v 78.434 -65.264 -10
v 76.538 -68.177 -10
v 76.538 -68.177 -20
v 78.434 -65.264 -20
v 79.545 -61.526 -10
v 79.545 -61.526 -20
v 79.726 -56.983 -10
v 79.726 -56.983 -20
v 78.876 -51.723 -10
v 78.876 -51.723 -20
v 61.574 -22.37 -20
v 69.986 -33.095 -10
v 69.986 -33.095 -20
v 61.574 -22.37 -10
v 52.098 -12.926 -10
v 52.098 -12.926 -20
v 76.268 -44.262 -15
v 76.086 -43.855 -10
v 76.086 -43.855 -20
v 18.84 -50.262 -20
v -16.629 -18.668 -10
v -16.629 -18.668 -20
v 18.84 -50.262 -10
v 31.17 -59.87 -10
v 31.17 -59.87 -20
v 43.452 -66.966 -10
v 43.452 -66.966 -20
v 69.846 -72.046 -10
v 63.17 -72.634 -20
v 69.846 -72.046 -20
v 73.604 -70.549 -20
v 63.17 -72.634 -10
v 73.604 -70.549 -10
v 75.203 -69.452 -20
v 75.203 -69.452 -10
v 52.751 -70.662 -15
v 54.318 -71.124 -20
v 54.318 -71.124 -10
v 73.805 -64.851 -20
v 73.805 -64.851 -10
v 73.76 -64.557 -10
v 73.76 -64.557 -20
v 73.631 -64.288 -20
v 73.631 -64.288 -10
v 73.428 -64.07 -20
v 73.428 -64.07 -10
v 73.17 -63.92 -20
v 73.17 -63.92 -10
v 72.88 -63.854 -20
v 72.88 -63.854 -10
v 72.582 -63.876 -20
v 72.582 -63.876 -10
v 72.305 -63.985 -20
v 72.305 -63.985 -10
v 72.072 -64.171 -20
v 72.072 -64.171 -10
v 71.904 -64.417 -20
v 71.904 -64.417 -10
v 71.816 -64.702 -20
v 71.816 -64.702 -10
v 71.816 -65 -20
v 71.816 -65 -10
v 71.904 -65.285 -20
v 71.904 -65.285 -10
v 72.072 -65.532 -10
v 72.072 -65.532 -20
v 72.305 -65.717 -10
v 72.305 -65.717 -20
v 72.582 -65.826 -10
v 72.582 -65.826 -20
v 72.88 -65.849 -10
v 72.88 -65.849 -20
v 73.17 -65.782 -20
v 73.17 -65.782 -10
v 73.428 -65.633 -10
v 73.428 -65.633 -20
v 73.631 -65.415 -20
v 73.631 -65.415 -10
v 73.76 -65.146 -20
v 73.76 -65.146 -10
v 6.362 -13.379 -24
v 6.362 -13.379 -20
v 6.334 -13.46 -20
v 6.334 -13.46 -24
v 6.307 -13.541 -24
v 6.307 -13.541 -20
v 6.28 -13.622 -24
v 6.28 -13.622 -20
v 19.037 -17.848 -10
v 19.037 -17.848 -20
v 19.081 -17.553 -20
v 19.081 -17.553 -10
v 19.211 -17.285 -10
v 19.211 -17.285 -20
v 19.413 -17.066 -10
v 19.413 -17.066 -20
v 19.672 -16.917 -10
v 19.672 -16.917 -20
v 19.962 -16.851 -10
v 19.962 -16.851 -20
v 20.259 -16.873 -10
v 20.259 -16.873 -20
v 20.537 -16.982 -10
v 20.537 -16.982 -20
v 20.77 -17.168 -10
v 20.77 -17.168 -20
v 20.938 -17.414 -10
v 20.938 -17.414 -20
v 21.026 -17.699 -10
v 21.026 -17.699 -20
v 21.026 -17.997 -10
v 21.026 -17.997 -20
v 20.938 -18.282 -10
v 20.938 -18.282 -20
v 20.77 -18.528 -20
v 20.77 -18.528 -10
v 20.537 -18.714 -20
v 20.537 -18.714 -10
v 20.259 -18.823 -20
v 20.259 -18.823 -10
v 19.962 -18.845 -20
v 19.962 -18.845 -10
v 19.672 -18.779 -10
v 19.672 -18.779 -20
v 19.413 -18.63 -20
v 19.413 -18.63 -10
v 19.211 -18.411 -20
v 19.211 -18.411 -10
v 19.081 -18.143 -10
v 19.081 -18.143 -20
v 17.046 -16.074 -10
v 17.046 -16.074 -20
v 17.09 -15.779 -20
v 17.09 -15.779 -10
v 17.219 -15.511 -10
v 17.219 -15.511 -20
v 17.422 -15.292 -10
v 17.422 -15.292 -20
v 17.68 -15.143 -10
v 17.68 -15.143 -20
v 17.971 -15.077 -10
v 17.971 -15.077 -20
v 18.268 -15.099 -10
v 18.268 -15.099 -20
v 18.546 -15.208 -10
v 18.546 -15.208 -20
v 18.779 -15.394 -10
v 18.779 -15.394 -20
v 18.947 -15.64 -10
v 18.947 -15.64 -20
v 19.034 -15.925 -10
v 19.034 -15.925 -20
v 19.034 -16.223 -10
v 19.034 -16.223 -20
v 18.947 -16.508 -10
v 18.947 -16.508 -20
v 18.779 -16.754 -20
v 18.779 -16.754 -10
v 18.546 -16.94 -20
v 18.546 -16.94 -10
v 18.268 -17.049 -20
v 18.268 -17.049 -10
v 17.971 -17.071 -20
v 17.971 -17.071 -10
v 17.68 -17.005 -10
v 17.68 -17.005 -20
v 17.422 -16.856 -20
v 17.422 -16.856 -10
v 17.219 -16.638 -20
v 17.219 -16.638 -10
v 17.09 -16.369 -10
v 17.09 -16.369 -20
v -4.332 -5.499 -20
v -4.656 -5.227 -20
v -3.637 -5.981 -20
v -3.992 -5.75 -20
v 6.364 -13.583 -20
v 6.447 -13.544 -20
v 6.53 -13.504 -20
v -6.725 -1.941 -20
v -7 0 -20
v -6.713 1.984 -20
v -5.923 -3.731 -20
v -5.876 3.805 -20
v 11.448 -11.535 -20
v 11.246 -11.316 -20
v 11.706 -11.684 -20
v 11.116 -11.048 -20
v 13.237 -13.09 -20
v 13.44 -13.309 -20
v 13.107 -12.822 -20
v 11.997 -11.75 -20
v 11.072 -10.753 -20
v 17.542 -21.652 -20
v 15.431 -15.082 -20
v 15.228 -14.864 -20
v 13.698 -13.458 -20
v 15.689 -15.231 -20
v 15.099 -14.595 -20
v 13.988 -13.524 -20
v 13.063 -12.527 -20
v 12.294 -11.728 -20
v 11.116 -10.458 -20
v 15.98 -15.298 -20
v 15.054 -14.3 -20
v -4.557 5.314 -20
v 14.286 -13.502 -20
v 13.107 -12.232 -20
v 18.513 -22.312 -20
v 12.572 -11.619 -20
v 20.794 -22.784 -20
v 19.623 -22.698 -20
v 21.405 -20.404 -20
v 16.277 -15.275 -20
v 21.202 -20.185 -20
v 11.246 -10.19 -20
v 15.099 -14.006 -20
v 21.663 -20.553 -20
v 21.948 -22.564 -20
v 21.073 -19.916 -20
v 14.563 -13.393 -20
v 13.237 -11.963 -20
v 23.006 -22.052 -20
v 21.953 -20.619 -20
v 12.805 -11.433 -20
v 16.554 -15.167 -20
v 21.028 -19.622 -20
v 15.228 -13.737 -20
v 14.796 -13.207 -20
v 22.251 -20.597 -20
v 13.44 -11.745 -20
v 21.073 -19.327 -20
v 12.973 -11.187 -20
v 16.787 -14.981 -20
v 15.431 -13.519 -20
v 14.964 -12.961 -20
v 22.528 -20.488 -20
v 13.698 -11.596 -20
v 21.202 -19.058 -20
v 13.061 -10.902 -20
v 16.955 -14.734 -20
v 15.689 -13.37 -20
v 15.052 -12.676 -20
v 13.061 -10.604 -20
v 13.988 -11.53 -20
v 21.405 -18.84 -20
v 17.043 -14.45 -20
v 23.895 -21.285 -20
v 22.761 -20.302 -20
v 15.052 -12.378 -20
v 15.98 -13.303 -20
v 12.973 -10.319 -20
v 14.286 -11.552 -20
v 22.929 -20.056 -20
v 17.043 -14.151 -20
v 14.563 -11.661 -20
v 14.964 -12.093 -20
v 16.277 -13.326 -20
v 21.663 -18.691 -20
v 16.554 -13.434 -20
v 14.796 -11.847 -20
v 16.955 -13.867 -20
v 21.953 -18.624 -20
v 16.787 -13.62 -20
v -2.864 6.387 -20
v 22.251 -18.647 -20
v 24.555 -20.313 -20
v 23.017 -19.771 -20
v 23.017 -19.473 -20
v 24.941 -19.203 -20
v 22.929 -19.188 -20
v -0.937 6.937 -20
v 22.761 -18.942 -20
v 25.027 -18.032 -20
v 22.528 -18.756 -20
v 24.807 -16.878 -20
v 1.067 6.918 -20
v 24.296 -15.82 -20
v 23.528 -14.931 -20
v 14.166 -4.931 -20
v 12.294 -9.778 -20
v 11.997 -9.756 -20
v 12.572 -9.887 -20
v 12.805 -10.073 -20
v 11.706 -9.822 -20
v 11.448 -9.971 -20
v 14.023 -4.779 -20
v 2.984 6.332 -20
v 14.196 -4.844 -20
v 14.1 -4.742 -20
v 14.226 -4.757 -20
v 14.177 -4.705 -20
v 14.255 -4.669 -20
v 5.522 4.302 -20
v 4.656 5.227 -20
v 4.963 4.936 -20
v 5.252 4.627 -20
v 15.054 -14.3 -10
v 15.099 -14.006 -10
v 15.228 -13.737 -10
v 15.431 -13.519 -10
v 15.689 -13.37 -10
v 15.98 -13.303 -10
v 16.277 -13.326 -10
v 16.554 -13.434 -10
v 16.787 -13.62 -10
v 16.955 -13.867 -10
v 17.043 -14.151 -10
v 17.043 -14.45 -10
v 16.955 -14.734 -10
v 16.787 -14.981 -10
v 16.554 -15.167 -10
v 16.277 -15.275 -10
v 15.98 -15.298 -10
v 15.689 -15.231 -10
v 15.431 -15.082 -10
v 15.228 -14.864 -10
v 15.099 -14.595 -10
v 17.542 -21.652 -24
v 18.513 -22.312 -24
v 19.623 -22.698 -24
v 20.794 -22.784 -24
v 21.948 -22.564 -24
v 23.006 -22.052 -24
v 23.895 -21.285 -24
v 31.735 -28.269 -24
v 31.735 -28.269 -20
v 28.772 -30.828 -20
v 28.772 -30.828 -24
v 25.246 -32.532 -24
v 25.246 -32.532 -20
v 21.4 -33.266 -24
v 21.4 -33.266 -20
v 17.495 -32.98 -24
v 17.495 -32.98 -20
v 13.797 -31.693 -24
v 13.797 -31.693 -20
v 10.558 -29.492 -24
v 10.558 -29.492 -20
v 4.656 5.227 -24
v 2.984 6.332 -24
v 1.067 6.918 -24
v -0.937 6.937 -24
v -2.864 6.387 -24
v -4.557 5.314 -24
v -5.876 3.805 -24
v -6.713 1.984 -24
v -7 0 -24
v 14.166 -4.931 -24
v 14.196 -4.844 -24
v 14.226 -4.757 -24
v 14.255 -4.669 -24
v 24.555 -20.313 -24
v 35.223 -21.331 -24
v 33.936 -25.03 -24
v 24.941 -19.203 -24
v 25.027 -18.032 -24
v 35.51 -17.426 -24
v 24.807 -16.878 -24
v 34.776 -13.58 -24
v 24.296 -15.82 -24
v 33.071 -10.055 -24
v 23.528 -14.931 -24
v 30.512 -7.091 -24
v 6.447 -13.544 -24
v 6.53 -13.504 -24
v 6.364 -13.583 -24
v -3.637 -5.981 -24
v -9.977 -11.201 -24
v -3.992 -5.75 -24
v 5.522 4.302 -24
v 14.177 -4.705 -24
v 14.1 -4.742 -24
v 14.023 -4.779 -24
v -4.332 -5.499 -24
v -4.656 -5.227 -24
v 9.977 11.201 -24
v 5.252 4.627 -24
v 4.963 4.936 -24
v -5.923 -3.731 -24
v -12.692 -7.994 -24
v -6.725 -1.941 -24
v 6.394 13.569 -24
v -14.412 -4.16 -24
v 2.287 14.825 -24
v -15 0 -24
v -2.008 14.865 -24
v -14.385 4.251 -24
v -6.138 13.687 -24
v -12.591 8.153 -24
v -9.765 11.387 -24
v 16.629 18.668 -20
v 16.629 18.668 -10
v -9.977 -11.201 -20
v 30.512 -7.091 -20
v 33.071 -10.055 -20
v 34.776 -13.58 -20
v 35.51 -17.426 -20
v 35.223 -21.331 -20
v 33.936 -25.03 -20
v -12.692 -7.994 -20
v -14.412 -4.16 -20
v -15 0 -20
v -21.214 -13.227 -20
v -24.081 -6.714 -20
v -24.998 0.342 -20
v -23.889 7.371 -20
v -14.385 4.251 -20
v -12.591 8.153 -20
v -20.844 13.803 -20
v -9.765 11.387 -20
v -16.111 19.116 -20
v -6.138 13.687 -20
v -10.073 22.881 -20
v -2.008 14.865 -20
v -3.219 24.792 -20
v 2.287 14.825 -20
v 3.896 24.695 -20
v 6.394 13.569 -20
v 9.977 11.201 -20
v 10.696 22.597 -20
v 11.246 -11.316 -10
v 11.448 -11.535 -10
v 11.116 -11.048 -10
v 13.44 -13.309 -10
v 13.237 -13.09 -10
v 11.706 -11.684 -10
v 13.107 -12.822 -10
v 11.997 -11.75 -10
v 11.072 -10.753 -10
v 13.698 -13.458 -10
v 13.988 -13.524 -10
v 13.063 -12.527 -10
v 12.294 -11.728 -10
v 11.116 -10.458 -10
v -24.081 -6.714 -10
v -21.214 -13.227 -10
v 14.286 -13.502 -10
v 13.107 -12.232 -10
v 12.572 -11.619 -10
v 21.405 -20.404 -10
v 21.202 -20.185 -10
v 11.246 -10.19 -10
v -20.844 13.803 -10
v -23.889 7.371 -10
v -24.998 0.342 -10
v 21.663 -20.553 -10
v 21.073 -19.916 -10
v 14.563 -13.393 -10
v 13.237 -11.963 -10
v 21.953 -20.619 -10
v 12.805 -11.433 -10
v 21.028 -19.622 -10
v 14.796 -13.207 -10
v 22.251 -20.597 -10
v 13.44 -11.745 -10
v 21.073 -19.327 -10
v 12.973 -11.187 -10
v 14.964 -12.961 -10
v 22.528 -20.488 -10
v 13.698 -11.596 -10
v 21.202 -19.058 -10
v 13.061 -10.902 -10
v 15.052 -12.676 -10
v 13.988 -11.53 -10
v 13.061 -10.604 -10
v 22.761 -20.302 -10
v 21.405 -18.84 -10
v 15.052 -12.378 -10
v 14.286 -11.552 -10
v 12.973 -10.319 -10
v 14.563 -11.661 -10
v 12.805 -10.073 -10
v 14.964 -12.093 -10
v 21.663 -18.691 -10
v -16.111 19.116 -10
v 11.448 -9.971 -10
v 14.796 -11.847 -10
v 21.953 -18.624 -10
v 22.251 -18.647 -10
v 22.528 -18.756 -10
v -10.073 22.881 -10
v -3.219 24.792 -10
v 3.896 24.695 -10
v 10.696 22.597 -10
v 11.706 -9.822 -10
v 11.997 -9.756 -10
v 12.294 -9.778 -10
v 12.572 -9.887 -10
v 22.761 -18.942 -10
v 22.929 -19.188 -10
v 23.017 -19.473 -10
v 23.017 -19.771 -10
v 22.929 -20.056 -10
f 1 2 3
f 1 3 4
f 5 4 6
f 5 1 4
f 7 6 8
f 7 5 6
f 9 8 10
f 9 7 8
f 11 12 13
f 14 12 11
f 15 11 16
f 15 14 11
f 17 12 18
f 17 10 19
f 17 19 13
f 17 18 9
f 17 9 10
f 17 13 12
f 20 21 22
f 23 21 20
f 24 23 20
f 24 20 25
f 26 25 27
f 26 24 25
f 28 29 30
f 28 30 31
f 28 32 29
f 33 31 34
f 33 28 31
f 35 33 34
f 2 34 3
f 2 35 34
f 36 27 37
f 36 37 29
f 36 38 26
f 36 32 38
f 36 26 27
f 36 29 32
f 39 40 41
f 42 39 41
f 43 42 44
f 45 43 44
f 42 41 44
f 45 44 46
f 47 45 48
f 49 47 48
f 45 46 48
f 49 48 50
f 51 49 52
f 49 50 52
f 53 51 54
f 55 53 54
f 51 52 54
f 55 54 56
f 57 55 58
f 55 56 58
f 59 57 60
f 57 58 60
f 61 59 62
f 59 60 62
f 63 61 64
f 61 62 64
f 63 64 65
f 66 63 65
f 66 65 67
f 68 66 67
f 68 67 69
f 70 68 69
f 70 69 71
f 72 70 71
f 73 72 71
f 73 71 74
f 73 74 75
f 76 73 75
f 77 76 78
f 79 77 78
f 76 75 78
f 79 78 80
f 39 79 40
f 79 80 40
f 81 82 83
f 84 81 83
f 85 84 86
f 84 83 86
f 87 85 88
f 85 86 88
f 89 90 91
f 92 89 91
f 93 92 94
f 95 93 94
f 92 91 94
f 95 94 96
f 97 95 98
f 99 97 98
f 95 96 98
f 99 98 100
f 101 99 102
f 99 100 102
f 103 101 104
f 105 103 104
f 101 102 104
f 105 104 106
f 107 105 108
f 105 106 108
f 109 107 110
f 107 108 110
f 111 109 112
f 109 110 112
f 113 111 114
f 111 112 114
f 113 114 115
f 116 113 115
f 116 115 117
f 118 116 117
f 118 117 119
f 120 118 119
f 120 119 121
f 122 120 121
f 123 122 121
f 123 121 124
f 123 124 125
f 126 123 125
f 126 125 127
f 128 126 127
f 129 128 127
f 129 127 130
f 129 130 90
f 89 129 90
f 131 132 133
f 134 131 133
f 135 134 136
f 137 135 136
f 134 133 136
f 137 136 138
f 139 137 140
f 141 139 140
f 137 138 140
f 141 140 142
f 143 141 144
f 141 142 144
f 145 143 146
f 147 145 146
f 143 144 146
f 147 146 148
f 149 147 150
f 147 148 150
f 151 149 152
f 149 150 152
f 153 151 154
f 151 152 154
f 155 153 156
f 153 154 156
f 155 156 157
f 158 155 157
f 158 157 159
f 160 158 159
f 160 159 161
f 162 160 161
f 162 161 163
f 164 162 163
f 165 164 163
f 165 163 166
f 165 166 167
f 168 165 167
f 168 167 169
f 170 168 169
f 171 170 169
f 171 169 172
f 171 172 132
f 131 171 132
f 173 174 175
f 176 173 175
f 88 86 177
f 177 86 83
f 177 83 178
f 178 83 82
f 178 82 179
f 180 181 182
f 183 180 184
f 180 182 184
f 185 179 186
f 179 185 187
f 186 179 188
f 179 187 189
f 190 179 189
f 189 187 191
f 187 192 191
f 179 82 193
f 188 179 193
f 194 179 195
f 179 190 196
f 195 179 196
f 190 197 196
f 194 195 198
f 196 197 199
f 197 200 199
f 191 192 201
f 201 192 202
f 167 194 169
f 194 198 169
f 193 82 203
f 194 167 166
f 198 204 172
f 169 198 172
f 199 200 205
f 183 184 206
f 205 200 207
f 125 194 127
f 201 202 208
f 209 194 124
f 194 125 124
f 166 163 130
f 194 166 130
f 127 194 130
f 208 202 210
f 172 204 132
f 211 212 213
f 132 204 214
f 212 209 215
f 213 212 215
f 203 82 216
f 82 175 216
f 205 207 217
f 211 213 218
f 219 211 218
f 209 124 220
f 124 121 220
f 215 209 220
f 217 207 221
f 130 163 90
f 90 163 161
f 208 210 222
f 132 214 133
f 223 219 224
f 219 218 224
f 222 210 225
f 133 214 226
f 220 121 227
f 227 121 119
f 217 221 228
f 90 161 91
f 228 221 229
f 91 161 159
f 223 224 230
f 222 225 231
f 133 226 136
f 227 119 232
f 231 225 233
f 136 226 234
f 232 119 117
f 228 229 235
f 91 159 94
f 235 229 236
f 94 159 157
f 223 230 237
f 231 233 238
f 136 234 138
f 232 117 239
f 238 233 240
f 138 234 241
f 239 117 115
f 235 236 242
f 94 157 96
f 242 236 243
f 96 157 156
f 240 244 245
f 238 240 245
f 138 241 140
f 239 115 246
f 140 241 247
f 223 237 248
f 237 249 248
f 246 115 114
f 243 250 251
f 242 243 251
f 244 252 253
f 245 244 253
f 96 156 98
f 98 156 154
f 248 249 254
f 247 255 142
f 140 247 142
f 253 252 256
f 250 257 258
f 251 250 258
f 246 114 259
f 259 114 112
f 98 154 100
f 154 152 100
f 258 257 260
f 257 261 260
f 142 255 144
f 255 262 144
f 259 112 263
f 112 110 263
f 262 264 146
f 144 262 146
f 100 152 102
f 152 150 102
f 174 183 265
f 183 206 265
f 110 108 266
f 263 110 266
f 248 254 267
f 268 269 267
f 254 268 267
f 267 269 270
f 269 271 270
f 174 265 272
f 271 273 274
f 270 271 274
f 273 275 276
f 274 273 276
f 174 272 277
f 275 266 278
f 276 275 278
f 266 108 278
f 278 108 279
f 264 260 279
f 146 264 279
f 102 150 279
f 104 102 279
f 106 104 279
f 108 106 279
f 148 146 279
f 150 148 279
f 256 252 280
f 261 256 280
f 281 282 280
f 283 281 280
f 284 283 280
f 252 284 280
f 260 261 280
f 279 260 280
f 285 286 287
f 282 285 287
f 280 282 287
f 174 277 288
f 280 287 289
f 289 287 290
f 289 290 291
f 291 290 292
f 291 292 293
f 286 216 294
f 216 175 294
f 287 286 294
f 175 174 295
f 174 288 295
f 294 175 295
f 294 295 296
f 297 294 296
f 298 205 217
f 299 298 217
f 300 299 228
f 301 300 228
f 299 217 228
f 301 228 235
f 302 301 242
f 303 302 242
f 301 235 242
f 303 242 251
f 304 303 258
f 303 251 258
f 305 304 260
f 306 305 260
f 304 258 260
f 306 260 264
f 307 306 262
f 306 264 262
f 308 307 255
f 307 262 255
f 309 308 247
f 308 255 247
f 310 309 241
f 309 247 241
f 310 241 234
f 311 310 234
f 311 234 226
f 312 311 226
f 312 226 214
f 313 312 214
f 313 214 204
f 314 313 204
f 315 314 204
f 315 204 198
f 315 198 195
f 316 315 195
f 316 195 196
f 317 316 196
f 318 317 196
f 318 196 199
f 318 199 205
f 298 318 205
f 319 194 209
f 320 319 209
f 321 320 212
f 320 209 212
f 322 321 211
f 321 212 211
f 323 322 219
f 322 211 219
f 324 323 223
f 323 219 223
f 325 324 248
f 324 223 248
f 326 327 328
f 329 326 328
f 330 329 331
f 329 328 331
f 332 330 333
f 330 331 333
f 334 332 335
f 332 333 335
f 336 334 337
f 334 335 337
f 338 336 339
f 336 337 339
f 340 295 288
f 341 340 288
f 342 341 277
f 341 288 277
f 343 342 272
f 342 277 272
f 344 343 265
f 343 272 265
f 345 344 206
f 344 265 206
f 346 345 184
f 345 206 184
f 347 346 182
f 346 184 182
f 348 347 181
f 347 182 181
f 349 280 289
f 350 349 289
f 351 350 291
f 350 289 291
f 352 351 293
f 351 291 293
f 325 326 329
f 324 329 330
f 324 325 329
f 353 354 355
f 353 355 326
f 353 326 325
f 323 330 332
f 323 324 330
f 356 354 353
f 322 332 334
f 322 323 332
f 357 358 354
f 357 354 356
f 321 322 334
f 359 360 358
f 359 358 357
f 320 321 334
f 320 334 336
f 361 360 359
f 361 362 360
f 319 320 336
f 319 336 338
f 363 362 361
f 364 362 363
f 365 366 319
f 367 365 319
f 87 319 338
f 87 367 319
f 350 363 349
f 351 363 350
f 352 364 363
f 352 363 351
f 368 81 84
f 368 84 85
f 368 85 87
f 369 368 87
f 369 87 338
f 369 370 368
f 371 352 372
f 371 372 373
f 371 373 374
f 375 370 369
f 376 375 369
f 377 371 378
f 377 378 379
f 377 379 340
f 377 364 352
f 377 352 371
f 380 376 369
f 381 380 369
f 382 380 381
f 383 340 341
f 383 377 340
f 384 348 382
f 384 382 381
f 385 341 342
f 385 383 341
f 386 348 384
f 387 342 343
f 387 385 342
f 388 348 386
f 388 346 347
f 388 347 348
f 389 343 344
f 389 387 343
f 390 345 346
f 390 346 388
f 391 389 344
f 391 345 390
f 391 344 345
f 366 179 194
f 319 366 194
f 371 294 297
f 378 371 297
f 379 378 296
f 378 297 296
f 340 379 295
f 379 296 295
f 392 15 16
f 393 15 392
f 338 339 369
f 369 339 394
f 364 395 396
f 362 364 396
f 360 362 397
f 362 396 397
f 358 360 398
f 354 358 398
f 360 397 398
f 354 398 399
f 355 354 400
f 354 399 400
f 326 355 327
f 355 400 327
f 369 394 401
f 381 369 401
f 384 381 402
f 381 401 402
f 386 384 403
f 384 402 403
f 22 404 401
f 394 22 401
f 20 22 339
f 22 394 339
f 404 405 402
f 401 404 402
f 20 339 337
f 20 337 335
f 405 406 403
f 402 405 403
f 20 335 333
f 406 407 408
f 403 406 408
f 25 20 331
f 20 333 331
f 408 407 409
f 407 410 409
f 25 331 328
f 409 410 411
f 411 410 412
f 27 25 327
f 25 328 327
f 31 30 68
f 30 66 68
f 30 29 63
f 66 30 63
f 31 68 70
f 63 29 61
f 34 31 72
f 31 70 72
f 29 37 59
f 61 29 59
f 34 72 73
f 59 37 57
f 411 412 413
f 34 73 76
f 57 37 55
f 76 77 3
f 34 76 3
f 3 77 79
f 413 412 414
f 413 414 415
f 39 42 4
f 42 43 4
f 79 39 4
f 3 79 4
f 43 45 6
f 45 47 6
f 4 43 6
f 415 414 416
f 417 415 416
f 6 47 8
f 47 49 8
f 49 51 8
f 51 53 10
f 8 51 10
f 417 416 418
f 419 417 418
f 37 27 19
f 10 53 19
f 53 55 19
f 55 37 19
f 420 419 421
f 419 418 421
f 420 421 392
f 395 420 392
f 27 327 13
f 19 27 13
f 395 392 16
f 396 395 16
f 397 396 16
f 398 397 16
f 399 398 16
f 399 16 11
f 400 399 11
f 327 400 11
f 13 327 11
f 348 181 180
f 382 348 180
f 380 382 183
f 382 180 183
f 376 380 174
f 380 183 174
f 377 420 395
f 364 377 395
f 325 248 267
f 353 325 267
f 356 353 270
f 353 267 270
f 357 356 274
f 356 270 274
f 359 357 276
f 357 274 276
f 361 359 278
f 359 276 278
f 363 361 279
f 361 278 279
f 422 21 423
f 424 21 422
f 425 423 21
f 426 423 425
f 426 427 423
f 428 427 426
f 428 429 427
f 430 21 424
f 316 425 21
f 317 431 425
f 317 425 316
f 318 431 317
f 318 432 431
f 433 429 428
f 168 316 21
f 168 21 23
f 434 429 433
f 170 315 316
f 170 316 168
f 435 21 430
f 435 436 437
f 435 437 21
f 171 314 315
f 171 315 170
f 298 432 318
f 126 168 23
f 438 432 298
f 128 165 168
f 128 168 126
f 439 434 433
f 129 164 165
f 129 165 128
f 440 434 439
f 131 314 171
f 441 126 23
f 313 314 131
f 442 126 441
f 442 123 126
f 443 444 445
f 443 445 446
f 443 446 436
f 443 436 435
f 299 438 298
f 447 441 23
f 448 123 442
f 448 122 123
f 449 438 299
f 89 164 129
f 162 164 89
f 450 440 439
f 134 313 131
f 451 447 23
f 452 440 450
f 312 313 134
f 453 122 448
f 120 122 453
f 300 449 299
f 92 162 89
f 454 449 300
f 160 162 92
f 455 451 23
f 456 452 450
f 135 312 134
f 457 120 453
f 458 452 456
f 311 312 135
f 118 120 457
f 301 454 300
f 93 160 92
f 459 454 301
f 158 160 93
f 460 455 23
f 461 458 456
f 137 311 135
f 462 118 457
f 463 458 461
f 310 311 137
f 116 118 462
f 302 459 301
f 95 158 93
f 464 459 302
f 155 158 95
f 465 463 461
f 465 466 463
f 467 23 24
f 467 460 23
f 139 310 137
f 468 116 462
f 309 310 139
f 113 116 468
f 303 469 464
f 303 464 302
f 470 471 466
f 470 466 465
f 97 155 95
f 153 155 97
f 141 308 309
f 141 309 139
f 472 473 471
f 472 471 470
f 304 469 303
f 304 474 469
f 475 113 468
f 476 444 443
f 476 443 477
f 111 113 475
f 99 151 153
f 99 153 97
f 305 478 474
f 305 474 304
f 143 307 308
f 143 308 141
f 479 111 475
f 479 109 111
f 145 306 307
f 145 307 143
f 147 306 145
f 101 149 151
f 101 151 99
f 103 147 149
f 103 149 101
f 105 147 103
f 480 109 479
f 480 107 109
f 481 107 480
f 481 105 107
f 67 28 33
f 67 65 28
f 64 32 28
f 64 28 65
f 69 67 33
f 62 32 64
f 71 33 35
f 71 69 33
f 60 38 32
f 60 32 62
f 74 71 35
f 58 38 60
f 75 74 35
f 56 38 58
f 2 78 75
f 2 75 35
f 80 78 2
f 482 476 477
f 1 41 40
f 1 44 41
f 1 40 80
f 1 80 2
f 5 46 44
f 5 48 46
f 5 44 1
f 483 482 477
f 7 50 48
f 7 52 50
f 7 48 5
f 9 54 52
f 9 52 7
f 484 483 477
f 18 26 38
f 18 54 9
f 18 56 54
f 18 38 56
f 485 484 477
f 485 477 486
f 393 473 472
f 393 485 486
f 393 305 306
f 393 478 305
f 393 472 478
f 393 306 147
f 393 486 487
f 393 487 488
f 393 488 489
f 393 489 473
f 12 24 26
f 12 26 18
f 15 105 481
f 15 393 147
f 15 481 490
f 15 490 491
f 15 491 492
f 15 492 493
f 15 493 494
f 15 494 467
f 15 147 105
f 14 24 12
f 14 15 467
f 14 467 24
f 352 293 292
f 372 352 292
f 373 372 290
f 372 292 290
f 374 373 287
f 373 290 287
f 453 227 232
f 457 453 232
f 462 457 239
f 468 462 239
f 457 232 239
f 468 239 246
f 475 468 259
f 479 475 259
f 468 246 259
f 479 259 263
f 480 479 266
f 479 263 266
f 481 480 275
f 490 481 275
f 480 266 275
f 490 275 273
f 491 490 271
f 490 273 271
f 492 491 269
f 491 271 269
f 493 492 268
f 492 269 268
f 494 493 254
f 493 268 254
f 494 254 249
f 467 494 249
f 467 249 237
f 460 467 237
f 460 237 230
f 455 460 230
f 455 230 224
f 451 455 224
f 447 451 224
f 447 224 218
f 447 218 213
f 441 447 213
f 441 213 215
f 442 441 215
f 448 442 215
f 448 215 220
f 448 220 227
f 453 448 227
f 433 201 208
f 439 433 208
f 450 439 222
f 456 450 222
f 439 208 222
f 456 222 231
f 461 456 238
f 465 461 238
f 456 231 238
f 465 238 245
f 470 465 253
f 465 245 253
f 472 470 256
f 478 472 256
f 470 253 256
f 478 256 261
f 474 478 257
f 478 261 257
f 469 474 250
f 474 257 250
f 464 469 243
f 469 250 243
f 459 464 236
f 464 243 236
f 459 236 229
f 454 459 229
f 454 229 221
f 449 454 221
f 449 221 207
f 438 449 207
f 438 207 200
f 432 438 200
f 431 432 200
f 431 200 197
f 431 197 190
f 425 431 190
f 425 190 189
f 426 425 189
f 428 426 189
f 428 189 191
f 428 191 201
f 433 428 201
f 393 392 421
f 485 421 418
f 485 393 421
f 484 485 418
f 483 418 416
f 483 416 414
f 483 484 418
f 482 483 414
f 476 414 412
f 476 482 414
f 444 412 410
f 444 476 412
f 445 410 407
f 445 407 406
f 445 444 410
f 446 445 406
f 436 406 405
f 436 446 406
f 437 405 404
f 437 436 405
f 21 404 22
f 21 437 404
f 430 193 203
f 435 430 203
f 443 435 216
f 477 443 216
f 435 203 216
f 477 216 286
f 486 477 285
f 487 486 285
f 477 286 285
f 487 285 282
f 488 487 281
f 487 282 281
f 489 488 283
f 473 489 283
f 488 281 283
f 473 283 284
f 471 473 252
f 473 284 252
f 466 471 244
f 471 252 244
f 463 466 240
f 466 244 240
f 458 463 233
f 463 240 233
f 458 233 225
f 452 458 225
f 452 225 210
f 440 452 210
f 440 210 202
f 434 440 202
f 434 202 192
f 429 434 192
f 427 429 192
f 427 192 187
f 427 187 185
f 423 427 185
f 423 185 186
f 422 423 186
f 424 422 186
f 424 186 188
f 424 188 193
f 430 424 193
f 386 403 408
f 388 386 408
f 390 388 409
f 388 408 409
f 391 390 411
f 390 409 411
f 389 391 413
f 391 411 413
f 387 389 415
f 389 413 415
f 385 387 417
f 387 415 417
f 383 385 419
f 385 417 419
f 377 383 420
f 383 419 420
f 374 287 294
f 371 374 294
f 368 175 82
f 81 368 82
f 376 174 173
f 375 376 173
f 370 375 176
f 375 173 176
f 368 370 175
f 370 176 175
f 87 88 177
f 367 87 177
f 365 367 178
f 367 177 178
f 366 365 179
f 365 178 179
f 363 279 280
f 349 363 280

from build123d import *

# Parameters (mm, degrees)
BOSS_EXTRU_1_START      = -10
ESQUISSE1_R             = 1
BOSS_EXTRU_1_DEPTH      = 10
BOSS_EXTRU_4_DEPTH      = 4
ESQUISSE3_R             = 1
ENL_V_MAT_EXTRU_1_DEPTH = 109.372369122


with BuildPart() as part:
    # Esquisse1 → Boss.-Extru.1 (new body)
    with BuildSketch(Plane.XY.offset(BOSS_EXTRU_1_START)):
        with BuildLine():
            add(Edge.make_bspline(
                [(18.84048499, -50.262173902), (59.909901441, -86.844998182), (76.538457933, -68.177081613)],
                knots=[4.71238898, 4.71238898, 4.71238898, 6.283185307, 6.283185307, 6.283185307], degree=2, weights=[1, 0.707106781, 1]))
            add(Edge.make_bspline(
                [(76.538457933, -68.177081613), (93.167014424, -49.509165044), (52.097597972, -12.926340764)],
                knots=[0, 0, 0, 1.570796327, 1.570796327, 1.570796327], degree=2, weights=[1, 0.707106781, 1]))
            Line((52.097597972, -12.926340764), (16.628556491, 18.667916569))
            ThreePointArc((16.628556491, 18.667916569), (-18.667916569, 16.628556491), (-16.628556491, -18.667916569))
            Line((-16.628556491, -18.667916569), (18.84048499, -50.262173902))
        make_face()
        with Locations((72.804874619, -64.851370315)):
            Circle(ESQUISSE1_R, mode=Mode.SUBTRACT)
    extrude(amount=-BOSS_EXTRU_1_DEPTH)

    # Esquisse2 → Boss.-Extru.4 (add)
    with BuildSketch(Plane(origin=(0, 0, -20), x_dir=(-1, 0, 0), z_dir=(0, 0, -1))):
        with BuildLine():
            Line((-23.527848394, -14.931187158), (-30.51184212, -7.090662199))
            ThreePointArc((-30.51184212, -7.090662199), (-35.509733497, -17.426184936), (-31.735458167, -28.268546035))
            Line((-31.735458167, -28.268546035), (-23.894933208, -21.284552309))
            ThreePointArc((-23.894933208, -21.284552309), (-25.027215807, -18.031843979), (-23.527848394, -14.931187158))
        make_face()
        with BuildLine():
            ThreePointArc((-31.735458167, -28.268546035), (-21.39993543, -33.266437412), (-10.557574331, -29.492162082))
            Line((-10.557574331, -29.492162082), (-17.541568057, -21.651637123))
            ThreePointArc((-17.541568057, -21.651637123), (-20.794276387, -22.783919722), (-23.894933208, -21.284552309))
            Line((-23.894933208, -21.284552309), (-31.735458167, -28.268546035))
        make_face()
        with BuildLine():
            Line((-23.527848394, -14.931187158), (-30.51184212, -7.090662199))
            ThreePointArc((-30.51184212, -7.090662199), (-35.509733497, -17.426184936), (-31.735458167, -28.268546035))
            Line((-31.735458167, -28.268546035), (-23.894933208, -21.284552309))
            ThreePointArc((-23.894933208, -21.284552309), (-25.027215807, -18.031843979), (-23.527848394, -14.931187158))
        make_face()
        with BuildLine():
            ThreePointArc((-31.735458167, -28.268546035), (-21.39993543, -33.266437412), (-10.557574331, -29.492162082))
            Line((-10.557574331, -29.492162082), (-17.541568057, -21.651637123))
            ThreePointArc((-17.541568057, -21.651637123), (-20.794276387, -22.783919722), (-23.894933208, -21.284552309))
            Line((-23.894933208, -21.284552309), (-31.735458167, -28.268546035))
        make_face()
        with BuildLine():
            ThreePointArc((-14.254741883, -4.669296932), (-22.744462605, -3.455072107), (-30.51184212, -7.090662199))
            Line((-30.51184212, -7.090662199), (-23.527848394, -14.931187158))
            Line((-23.527848394, -14.931187158), (-14.166195215, -4.931421004))
            ThreePointArc((-14.166195215, -4.931421004), (-14.211072924, -4.800563129), (-14.254741883, -4.669296932))
        make_face()
        with BuildLine():
            Line((-17.541568057, -21.651637123), (-10.557574331, -29.492162082))
            ThreePointArc((-10.557574331, -29.492162082), (-6.847907862, -24.429123097), (-5.534708226, -18.29141214))
            ThreePointArc((-5.534708226, -18.29141214), (-5.722194458, -15.927213359), (-6.279966343, -13.622115208))
            ThreePointArc((-6.279966343, -13.622115208), (-6.405329622, -13.563618707), (-6.530148083, -13.503968528))
            Line((-6.530148083, -13.503968528), (-17.541568057, -21.651637123))
        make_face()
        with BuildLine():
            ThreePointArc((-5.522244788, 4.301722039), (-5.110106455, 4.784016306), (-4.655995817, 5.227016639))
            Line((-4.655995817, 5.227016639), (-9.977133895, 11.200749941))
            ThreePointArc((-9.977133895, 11.200749941), (-14.483112506, 3.903774088), (-14.254741883, -4.669296932))
            ThreePointArc((-14.254741883, -4.669296932), (-14.138662596, -4.723413014), (-14.023049593, -4.778518229))
            Line((-14.023049593, -4.778518229), (-5.522244788, 4.301722039))
        make_face()
        with BuildLine():
            Line((-9.977133895, 11.200749941), (-4.655995817, 5.227016639))
            ThreePointArc((-4.655995817, 5.227016639), (2.864265113, 6.387173503), (7, 0))
            ThreePointArc((7, 0), (6.387173503, -2.864265113), (4.655995817, -5.227016639))
            Line((4.655995817, -5.227016639), (9.977133895, -11.200749941))
            ThreePointArc((9.977133895, -11.200749941), (13.686800364, -6.137710957), (15, 0))
            ThreePointArc((15, 0), (6.137710957, 13.686800364), (-9.977133895, 11.200749941))
        make_face()
        with BuildLine():
            Line((9.977133895, -11.200749941), (4.655995817, -5.227016639))
            ThreePointArc((4.655995817, -5.227016639), (4.163642753, -5.627084416), (3.637091246, -5.980933645))
            Line((3.637091246, -5.980933645), (-6.361776479, -13.379385501))
            ThreePointArc((-6.361776479, -13.379385501), (-6.320353283, -13.500575724), (-6.279966343, -13.622115208))
            ThreePointArc((-6.279966343, -13.622115208), (2.209754379, -14.836340033), (9.977133895, -11.200749941))
        make_face()
        with BuildLine():
            Line((-10.557574331, -29.492162082), (9.977133895, -11.200749941))
            ThreePointArc((9.977133895, -11.200749941), (2.209754379, -14.836340033), (-6.279966343, -13.622115208))
            ThreePointArc((-6.279966343, -13.622115208), (-5.722194458, -15.927213359), (-5.534708226, -18.29141214))
            ThreePointArc((-5.534708226, -18.29141214), (-6.847907862, -24.429123097), (-10.557574331, -29.492162082))
        make_face()
        with BuildLine():
            ThreePointArc((-14.254741883, -4.669296932), (-14.483112506, 3.903774088), (-9.977133895, 11.200749941))
            Line((-9.977133895, 11.200749941), (-30.51184212, -7.090662199))
            ThreePointArc((-30.51184212, -7.090662199), (-22.744462605, -3.455072107), (-14.254741883, -4.669296932))
        make_face()
    extrude(amount=BOSS_EXTRU_4_DEPTH)

    # Esquisse3 → Enlèv. mat.-Extru.1 (cut, through all)
    with BuildSketch(Plane(origin=(0, 0, -20), x_dir=(-1, 0, 0), z_dir=(0, 0, -1))):
        with Locations((-20.036872227, -17.847961796)):
            Circle(ESQUISSE3_R)
        with Locations((-22.028141551, -19.621696659)):
            Circle(ESQUISSE3_R)
        with Locations((-18.045602902, -16.074226932)):
            Circle(ESQUISSE3_R)
        with Locations((-16.054333578, -14.300492068)):
            Circle(ESQUISSE3_R)
        with Locations((-14.063064253, -12.526757204)):
            Circle(ESQUISSE3_R)
        with Locations((-12.071794928, -10.753022341)):
            Circle(ESQUISSE3_R)
    extrude(amount=-ENL_V_MAT_EXTRU_1_DEPTH, mode=Mode.SUBTRACT)


solid = part.part
